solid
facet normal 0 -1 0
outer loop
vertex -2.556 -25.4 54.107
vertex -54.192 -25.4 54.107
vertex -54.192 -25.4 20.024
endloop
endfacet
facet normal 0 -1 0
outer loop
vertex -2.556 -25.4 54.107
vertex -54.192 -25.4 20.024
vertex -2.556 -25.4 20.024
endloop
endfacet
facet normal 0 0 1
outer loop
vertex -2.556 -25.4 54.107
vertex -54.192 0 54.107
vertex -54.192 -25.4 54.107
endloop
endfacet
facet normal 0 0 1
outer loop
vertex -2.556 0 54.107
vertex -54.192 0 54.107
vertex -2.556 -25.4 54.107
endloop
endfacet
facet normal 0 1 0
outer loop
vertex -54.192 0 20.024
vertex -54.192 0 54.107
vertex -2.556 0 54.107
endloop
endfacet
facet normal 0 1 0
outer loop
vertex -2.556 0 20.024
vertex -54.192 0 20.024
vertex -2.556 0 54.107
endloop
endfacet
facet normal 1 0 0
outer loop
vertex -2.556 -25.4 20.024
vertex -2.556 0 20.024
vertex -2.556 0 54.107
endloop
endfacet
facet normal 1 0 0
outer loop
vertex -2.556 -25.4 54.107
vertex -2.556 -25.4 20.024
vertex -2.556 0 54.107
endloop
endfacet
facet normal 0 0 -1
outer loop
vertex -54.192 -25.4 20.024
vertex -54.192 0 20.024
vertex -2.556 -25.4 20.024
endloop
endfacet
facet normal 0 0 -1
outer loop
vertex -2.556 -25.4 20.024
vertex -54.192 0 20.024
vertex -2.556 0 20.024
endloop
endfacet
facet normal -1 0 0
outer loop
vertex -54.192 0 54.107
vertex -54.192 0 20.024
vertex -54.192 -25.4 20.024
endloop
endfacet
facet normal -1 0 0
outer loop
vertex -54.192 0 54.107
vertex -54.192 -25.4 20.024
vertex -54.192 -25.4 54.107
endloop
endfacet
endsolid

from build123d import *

# Parameters (mm, degrees)
F0_W     = 51.6358476598
F0_H     = 34.0830702335
F1_DEPTH = 25.4


# Not quite as in the source:
# - the program builds the solid bodies; features that only make, move or delete a surface that nothing else refers to are left out


with BuildPart() as f1:
    # F0 (on Front) → F1 (new body)
    with BuildSketch(Plane.XZ):
        with Locations((-28.3741535386, 37.0653374121)):
            Rectangle(F0_W, F0_H)
    extrude(amount=F1_DEPTH)


with BuildPart() as f1b:
    # F0 (on Front) → F1, piece 2 (new body)
    with BuildSketch(Plane.XZ):
        with BuildLine():
            add(Edge.make_bspline(
                [(22.3244093359, -13.7184355408), (20.9649784334, -4.7843207272), (25.9798632943, 15.3706872491), (65.2765981799, 46.8827002107), (65.9557933658, 4.9138085279), (31.1793653474, -36.4502806513), (23.2965008124, -20.1069741898), (22.3244093359, -13.7184355408)],
                knots=[0, 0, 0, 0, 0.2008979891, 0.4184498703, 0.6092802876, 0.8563433989, 1, 1, 1, 1], degree=3))
        make_face()
    extrude(amount=F1_DEPTH)


solid = f1.part
